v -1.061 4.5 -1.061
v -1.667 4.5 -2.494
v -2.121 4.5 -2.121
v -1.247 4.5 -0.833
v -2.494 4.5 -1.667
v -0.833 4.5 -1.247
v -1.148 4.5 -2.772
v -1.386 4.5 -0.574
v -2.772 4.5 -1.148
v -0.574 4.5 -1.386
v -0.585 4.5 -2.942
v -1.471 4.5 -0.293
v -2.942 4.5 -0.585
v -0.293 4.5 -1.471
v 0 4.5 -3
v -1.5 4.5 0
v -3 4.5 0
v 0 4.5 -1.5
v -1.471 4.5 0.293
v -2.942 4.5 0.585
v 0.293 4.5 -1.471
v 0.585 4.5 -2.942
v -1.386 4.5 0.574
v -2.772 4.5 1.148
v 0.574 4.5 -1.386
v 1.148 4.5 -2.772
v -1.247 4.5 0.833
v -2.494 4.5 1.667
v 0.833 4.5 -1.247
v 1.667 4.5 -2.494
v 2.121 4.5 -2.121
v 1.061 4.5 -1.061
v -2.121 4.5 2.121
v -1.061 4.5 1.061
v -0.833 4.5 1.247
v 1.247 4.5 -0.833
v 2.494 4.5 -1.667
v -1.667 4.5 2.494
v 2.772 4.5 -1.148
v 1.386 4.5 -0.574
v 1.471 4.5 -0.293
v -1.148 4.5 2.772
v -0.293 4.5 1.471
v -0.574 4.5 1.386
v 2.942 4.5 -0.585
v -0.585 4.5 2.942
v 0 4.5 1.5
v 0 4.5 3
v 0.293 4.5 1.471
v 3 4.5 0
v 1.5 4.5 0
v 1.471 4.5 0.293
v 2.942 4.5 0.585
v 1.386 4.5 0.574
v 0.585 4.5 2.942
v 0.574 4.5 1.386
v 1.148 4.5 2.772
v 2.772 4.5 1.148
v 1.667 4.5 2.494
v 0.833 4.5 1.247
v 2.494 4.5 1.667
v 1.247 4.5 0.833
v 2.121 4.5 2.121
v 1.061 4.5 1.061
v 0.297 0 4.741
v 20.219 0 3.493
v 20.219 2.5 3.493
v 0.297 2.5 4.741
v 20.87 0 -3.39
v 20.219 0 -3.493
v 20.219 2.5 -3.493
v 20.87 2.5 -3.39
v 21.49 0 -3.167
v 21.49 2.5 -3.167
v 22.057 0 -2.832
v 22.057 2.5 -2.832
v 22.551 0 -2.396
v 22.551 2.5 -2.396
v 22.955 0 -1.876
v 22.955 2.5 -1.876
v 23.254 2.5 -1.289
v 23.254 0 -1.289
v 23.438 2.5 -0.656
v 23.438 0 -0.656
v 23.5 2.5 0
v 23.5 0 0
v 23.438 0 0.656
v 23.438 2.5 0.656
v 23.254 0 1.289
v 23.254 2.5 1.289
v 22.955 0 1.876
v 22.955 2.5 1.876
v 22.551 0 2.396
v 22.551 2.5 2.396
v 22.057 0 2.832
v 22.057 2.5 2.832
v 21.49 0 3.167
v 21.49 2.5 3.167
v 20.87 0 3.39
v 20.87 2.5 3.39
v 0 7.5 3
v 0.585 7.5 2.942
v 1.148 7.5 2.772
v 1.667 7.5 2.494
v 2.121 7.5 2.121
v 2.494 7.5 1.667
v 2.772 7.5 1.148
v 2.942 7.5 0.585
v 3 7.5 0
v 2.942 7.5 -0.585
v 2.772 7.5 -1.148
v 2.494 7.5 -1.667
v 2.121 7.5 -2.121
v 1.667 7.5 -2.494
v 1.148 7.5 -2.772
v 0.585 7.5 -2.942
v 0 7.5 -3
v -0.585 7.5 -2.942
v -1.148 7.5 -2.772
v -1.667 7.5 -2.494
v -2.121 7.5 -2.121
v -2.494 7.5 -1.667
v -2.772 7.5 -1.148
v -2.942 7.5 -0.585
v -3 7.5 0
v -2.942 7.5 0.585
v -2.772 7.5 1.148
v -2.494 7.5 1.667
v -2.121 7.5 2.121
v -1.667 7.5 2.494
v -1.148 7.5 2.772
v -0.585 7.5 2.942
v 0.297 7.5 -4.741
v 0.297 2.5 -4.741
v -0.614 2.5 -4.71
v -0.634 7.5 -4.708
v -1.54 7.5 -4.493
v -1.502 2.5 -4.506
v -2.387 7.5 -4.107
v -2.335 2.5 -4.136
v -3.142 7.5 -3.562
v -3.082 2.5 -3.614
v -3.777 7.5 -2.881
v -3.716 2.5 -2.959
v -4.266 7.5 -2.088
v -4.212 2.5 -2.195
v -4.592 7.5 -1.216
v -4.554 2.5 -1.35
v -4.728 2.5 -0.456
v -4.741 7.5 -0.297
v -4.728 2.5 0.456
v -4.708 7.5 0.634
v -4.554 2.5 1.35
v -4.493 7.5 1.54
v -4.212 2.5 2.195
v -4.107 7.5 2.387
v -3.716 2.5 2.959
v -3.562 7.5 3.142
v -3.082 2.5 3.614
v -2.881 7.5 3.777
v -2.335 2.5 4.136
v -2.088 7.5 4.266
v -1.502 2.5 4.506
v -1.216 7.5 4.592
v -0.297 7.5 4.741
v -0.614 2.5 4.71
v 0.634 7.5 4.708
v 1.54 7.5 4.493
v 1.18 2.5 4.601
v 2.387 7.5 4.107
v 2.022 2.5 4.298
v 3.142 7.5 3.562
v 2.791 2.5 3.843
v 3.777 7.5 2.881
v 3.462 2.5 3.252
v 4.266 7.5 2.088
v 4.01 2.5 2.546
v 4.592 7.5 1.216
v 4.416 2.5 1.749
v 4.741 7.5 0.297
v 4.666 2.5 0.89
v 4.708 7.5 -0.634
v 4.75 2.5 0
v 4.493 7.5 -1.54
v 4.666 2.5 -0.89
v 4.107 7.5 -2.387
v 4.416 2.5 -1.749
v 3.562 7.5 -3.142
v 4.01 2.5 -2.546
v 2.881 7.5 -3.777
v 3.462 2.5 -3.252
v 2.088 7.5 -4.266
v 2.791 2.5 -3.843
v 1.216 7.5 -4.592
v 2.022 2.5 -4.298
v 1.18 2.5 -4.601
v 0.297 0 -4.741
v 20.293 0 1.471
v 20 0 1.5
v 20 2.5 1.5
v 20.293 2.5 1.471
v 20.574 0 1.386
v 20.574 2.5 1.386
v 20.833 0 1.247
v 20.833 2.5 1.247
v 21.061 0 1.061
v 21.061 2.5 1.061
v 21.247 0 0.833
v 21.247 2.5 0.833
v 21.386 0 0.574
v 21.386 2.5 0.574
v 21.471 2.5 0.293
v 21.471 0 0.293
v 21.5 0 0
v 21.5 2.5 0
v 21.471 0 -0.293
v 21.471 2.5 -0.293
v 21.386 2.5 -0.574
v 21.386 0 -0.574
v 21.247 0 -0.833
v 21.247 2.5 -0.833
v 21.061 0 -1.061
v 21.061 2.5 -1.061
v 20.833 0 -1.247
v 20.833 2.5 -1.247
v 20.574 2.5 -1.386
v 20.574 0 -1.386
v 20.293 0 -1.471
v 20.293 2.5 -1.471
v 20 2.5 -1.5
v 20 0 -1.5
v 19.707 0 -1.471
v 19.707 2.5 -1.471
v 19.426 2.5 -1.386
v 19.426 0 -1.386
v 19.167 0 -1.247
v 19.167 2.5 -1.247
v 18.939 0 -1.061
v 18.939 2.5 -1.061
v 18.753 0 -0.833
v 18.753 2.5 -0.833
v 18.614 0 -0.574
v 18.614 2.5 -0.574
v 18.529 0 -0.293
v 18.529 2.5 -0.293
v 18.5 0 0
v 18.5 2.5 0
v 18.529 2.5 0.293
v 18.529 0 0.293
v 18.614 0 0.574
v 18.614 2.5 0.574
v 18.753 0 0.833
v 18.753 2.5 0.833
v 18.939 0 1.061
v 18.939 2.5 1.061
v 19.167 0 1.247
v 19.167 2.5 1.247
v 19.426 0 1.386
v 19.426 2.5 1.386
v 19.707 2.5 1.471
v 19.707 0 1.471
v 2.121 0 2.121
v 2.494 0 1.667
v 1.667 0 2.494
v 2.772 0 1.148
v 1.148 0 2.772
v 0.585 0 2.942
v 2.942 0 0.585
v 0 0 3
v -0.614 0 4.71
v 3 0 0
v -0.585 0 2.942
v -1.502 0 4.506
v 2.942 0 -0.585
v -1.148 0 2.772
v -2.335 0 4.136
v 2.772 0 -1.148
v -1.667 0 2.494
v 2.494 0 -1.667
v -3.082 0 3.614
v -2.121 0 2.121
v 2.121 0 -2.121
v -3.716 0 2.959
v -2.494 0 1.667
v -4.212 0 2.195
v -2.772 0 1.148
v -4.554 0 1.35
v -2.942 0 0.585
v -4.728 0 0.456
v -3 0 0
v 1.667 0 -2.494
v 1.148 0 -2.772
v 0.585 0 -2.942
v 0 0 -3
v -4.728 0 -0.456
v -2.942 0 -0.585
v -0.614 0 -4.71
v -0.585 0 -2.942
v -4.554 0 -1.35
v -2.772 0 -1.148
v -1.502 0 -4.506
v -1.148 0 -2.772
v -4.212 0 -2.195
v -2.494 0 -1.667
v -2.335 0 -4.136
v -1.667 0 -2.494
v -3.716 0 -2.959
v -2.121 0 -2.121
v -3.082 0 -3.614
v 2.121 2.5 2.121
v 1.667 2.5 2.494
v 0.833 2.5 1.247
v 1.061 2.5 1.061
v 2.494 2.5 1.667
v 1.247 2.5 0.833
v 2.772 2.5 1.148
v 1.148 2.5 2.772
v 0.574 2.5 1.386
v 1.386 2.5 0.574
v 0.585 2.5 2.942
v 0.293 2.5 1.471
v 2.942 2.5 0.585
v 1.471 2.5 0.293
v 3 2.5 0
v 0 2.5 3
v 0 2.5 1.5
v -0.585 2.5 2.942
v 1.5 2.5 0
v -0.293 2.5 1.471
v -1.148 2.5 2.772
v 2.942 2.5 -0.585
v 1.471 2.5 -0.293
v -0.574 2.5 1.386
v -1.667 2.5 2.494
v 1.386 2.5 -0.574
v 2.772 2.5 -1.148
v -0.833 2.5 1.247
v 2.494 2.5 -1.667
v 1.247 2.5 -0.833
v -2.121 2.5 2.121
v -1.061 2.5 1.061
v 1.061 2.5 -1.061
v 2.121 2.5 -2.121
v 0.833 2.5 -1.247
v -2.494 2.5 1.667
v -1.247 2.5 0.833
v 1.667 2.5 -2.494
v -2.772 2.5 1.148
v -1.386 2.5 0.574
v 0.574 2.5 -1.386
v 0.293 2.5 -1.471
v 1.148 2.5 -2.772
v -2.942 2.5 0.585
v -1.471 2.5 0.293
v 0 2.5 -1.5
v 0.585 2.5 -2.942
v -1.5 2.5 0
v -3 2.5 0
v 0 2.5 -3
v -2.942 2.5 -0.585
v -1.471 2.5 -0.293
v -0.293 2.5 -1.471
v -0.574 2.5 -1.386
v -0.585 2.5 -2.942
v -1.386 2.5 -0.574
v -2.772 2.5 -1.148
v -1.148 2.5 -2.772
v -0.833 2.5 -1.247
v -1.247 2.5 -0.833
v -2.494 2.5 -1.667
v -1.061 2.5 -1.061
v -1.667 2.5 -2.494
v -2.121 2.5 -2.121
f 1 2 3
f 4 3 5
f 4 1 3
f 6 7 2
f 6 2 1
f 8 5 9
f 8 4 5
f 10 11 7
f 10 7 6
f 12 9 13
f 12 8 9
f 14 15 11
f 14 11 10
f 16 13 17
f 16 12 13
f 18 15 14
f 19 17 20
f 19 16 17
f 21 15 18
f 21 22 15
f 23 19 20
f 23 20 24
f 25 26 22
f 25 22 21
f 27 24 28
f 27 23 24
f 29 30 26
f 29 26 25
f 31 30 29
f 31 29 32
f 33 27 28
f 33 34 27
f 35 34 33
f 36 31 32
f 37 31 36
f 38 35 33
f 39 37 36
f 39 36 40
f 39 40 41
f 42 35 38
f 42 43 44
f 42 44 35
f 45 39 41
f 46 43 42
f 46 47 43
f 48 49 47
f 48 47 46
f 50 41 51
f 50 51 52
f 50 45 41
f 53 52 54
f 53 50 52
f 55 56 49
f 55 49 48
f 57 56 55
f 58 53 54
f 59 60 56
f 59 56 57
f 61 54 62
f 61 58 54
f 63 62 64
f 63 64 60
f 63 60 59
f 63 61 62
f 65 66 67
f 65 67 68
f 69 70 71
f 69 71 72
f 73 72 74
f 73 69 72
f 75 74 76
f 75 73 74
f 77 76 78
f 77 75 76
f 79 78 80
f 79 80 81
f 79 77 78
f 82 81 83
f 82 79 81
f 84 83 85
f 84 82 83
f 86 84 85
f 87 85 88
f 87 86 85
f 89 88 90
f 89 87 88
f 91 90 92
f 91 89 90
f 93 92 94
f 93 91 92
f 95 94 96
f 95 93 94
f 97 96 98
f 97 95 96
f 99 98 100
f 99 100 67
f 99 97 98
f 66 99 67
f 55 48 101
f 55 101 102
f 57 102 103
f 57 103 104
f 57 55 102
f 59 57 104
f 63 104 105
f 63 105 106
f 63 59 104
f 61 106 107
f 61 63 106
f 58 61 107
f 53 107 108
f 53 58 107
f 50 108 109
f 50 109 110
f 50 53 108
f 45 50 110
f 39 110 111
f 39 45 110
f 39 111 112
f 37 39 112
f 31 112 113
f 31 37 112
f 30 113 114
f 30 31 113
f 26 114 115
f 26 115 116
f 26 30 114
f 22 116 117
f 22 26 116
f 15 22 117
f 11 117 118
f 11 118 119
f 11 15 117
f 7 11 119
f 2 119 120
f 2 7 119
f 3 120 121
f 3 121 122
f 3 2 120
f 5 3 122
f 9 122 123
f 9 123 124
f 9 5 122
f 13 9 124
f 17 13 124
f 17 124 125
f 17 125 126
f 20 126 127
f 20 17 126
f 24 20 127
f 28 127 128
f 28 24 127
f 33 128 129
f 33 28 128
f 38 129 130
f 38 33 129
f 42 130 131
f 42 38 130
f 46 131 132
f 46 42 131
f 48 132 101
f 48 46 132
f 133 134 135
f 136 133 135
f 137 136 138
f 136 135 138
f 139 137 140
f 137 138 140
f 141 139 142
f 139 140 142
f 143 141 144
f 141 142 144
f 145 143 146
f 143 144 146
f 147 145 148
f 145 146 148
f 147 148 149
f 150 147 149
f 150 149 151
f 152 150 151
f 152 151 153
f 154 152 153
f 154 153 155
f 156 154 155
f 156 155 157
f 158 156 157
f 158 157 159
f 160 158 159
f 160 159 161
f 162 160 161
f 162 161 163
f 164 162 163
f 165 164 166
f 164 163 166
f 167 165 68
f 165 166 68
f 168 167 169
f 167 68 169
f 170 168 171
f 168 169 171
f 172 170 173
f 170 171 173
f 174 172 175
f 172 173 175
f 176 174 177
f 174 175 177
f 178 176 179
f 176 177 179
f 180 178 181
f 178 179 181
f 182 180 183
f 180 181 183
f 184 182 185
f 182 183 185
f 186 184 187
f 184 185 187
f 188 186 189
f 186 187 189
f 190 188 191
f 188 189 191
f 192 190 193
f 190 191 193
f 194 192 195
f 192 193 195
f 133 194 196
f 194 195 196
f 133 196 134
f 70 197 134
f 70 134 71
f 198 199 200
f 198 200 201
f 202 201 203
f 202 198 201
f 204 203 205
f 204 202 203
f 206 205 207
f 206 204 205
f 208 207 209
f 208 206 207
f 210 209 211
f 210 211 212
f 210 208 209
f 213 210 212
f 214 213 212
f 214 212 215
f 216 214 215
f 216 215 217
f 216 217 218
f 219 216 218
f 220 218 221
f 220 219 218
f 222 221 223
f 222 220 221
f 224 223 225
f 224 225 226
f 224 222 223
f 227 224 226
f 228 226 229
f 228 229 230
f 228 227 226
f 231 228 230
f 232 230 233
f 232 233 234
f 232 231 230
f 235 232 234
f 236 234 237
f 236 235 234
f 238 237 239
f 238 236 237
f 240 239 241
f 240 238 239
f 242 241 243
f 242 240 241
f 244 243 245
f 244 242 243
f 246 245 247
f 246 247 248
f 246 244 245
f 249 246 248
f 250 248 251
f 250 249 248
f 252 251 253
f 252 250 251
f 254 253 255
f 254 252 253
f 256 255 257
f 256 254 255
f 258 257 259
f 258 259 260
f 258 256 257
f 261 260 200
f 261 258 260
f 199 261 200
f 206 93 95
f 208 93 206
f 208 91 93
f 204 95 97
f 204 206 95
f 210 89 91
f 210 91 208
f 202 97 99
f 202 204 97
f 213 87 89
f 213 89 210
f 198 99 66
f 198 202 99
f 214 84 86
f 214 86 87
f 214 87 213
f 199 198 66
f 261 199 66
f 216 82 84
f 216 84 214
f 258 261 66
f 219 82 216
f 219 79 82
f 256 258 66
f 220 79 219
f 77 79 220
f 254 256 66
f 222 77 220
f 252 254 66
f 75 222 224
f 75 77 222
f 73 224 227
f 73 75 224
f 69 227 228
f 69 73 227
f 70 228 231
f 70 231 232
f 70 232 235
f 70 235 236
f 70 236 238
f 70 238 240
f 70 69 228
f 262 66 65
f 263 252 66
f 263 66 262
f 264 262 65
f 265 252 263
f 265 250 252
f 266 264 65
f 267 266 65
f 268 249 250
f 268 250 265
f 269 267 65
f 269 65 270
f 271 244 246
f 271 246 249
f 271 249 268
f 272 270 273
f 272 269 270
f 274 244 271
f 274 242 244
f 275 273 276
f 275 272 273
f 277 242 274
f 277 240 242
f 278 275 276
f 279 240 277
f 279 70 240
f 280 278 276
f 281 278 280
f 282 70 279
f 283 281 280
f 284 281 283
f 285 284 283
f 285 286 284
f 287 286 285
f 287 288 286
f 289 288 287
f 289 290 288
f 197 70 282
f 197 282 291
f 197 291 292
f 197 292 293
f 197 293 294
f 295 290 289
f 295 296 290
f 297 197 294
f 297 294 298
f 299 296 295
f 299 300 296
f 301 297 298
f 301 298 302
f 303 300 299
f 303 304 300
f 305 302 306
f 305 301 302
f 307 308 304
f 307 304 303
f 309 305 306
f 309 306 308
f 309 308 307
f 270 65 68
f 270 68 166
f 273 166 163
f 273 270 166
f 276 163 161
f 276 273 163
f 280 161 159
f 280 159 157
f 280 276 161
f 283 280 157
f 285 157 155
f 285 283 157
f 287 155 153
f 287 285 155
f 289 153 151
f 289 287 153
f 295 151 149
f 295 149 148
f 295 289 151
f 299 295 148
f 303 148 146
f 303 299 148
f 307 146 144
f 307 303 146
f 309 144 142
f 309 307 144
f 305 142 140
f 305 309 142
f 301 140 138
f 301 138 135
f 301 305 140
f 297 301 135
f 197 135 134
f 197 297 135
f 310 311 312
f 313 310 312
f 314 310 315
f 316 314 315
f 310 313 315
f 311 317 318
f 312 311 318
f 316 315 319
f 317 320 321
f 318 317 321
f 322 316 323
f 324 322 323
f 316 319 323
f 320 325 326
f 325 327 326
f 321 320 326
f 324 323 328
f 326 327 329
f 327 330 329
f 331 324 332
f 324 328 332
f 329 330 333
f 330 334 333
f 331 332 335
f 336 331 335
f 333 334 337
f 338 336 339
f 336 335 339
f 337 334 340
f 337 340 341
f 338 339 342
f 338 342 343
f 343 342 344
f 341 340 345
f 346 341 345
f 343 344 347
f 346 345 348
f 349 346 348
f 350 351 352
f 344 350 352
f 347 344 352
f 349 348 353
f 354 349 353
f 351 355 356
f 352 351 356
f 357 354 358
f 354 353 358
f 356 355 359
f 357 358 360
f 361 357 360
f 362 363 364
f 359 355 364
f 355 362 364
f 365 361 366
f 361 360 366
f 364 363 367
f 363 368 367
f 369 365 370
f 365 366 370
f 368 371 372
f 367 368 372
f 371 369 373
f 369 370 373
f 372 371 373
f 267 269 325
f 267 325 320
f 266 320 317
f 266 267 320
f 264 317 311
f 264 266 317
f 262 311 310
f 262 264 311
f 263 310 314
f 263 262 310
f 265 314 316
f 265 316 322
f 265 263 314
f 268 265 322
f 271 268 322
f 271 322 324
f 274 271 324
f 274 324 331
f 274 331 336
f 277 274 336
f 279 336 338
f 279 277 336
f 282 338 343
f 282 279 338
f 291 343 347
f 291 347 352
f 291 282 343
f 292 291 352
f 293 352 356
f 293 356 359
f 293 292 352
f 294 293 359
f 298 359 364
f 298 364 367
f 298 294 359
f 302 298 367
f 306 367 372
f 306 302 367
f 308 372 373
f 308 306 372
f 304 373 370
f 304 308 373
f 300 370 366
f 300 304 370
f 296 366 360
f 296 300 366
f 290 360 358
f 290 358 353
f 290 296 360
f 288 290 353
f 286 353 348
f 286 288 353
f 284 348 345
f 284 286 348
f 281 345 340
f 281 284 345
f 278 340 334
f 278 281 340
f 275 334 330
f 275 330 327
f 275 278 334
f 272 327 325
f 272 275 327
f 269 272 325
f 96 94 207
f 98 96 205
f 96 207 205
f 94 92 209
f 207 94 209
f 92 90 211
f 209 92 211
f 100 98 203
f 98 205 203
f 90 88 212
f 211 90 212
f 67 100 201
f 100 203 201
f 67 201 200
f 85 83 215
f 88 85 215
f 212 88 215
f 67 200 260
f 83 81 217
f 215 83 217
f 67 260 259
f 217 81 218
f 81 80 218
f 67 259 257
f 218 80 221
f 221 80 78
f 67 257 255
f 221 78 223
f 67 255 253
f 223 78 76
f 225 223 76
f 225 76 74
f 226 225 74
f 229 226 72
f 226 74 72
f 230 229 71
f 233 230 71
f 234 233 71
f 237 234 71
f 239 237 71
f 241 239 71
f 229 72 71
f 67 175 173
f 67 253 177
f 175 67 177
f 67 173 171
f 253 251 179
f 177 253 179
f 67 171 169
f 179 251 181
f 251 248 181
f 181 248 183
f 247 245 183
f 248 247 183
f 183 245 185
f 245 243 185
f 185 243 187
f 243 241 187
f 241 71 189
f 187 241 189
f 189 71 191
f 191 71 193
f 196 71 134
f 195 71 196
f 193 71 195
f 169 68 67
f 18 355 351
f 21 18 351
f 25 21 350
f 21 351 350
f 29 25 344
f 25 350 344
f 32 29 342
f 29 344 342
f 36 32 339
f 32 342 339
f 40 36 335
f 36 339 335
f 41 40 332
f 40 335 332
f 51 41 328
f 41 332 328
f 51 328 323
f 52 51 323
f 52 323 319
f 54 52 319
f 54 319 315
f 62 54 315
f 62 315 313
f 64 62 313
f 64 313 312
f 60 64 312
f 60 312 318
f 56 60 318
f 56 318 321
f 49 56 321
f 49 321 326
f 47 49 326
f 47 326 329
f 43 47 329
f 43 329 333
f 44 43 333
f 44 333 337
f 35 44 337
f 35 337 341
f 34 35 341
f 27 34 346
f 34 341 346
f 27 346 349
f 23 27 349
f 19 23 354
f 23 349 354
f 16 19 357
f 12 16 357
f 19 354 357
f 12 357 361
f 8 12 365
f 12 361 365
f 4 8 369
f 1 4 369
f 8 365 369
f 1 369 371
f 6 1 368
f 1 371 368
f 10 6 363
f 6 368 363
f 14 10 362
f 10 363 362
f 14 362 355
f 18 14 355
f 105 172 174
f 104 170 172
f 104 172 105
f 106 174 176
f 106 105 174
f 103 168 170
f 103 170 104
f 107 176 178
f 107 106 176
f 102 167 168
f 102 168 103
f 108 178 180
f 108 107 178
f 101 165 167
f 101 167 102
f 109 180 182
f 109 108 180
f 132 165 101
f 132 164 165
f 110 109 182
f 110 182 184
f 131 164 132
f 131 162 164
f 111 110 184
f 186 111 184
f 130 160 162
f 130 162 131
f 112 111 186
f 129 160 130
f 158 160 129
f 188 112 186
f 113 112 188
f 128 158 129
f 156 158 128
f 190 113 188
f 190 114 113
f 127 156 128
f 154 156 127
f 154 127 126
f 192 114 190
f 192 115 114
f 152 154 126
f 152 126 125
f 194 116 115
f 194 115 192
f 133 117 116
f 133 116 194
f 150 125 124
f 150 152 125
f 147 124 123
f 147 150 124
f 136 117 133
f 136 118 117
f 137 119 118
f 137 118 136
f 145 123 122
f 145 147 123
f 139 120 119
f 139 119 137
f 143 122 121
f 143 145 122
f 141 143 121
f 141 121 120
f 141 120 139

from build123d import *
from build123d.topology import SkipClean

# Parameters (mm, degrees)
SKETCH_1_R          = 3
SKETCH_1_R_2        = 1.5
EXTRUDE_1_DEPTH     = 2.5
SKETCH_2_R          = 4.75
EXTRUDE_2_DEPTH     = 5
CUT_EXTRUDE_START   = -3
SKETCH_3_R          = 3
CUT_EXTRUDE_1_DEPTH = 3
SKETCH_4_R          = 1.5
CUT_EXTRUDE_2_DEPTH = 3


with BuildPart() as part:
    # 草图1 → 凸台-拉伸1 (new body)
    with BuildSketch(Plane(origin=(0, 0, 0), x_dir=(1, 0, 0), z_dir=(0, 1, 0))):
        with BuildLine():
            Line((0.296875, 4.740713579), (20.21875, 3.493157374))
            ThreePointArc((20.21875, 3.493157374), (23.5, 0), (20.21875, -3.493157374))
            Line((20.21875, -3.493157374), (0.296875, -4.740713579))
            ThreePointArc((0.296875, -4.740713579), (-4.75, 0), (0.296875, 4.740713579))
        make_face()
        with Locations(Location((0, 0, 0), (0, 0, 270))):
            Circle(SKETCH_1_R, mode=Mode.SUBTRACT)
        with Locations(Location((20, 0, 0), (0, 0, 270))):
            Circle(SKETCH_1_R_2, mode=Mode.SUBTRACT)
    extrude(amount=EXTRUDE_1_DEPTH)

    # 草图2 → 凸台-拉伸2 (add)
    with SkipClean():  # the faces are left unmerged after this step: merging them gives an invalid solid
        with BuildSketch(Plane(origin=(0, 2.5, 0), x_dir=(1, 0, 0), z_dir=(0, 1, 0))):
            with Locations(Location((0, 0, 0), (0, 0, 86.416678302))):
                Circle(SKETCH_2_R)
        extrude(amount=EXTRUDE_2_DEPTH)

    # 草图3 → 切除-拉伸1 (cut)
    with SkipClean():  # the faces are left unmerged after this step: merging them gives an invalid solid
        with BuildSketch(Plane(origin=(0, 7.5, 0), x_dir=(1, 0, 0), z_dir=(0, 1, 0)).offset(CUT_EXTRUDE_START)):
            with Locations(Location((0, 0, 0), (0, 0, 270))):
                Circle(SKETCH_3_R)
        extrude(amount=CUT_EXTRUDE_1_DEPTH, mode=Mode.SUBTRACT)

    # 草图4 → 切除-拉伸2 (cut)
    with SkipClean():  # the faces are left unmerged after this step: merging them gives an invalid solid
        with BuildSketch(Plane.XZ.offset(-2.5)):
            with Locations(Location((0, 0, 0), (0, 0, 270))):
                Circle(SKETCH_4_R)
        extrude(amount=-CUT_EXTRUDE_2_DEPTH, mode=Mode.SUBTRACT)


solid = part.part
